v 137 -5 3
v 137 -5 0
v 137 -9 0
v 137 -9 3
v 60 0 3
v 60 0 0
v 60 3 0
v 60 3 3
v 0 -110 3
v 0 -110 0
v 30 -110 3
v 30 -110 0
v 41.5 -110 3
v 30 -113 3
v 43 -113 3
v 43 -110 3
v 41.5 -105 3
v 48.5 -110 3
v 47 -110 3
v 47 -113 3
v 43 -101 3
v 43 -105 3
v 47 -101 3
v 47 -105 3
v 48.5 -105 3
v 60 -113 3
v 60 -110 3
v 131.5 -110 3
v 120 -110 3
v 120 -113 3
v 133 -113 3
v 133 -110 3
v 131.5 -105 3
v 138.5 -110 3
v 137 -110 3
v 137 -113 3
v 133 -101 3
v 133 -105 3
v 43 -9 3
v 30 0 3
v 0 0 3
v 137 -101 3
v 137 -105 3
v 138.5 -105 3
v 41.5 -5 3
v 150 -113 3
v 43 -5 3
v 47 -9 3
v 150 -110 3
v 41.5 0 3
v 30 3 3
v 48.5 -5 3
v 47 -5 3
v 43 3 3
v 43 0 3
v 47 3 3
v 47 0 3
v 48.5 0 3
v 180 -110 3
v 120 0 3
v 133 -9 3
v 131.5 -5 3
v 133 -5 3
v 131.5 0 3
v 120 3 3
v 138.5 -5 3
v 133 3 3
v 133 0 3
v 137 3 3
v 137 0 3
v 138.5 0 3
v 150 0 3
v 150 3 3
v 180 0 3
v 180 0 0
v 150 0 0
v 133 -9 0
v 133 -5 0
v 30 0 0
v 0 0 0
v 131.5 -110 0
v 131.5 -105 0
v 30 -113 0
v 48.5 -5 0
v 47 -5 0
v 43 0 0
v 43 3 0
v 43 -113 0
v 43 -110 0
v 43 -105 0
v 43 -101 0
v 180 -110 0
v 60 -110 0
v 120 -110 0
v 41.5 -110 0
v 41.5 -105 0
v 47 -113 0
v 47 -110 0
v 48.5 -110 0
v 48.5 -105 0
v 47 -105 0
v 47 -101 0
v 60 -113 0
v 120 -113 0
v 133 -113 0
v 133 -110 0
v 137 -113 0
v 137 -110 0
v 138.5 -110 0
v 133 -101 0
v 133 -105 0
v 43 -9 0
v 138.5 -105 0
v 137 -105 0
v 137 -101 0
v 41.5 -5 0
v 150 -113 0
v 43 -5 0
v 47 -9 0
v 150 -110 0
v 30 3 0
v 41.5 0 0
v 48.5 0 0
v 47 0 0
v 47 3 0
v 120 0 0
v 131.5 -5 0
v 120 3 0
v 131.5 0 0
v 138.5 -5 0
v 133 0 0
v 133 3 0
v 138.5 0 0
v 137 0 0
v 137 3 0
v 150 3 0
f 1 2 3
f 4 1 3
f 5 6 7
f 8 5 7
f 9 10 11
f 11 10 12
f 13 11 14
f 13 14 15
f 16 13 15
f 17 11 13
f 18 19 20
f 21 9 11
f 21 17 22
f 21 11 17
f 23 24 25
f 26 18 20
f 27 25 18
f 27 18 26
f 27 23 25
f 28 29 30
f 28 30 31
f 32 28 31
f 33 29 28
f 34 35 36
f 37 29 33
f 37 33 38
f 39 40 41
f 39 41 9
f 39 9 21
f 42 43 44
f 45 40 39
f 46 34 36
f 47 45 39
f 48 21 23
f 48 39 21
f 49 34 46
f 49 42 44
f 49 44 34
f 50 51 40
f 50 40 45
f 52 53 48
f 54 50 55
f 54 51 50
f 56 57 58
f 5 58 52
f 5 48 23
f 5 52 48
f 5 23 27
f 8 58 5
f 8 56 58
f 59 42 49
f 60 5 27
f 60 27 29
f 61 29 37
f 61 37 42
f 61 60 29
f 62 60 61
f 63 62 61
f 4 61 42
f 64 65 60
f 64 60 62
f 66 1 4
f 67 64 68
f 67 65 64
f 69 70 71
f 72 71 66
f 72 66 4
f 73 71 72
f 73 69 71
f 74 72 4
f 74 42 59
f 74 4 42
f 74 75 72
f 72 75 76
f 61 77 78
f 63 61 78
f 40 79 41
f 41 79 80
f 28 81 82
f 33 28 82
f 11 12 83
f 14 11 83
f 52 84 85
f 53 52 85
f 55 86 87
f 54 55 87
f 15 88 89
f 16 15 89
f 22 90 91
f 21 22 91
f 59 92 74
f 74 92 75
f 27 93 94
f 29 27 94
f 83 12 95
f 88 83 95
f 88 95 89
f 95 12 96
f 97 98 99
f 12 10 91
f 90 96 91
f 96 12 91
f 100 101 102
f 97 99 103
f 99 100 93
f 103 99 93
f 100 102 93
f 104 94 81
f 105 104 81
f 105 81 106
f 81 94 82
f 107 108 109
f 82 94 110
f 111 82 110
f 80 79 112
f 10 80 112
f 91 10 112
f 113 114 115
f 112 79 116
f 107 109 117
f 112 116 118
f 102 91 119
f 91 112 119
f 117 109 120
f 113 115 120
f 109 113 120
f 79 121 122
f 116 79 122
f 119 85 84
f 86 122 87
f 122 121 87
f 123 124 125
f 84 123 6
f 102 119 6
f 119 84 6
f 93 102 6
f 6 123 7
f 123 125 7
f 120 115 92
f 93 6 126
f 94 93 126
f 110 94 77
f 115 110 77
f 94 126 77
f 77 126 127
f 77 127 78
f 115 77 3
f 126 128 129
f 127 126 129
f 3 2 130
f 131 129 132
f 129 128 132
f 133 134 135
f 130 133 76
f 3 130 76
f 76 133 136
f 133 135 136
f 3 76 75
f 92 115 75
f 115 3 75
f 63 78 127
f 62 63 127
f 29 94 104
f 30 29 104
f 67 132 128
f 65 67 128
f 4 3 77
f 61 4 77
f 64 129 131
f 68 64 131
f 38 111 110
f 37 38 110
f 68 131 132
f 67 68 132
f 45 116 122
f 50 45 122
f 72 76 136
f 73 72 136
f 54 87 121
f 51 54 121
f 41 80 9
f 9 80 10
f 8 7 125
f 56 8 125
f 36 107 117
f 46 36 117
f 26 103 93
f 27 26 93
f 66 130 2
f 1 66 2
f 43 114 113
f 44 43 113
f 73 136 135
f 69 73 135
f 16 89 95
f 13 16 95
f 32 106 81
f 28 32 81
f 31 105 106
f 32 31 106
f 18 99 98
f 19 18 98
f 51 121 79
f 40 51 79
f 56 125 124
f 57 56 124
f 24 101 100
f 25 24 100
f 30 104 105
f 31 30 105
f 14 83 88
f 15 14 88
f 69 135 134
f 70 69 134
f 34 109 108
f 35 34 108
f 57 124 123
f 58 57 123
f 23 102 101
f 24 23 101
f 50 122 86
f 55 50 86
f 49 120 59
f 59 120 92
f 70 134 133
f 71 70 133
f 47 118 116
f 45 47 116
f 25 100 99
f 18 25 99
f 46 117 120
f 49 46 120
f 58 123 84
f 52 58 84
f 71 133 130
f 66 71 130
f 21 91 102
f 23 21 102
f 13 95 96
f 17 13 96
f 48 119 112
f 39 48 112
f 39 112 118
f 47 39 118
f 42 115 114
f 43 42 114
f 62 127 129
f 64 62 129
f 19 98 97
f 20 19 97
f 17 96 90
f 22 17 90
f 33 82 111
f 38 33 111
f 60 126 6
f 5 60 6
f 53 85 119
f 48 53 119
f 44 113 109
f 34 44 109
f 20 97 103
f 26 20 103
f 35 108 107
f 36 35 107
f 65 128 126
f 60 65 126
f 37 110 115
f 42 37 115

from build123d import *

# Parameters (mm, degrees)
EXTRUDE_1_DEPTH = 3


with BuildPart() as part:
    # 草图1 → 凸台-拉伸1 (new body)
    with BuildSketch(Plane.XY):
        Polygon((90, -55), (90, 0), (60, 0), (48.5, 0), (48.5, -5), (47, -5), (47, -9), (43, -9), (43, -5), (41.5, -5), (41.5, 0), (30, 0), (0, 0), (0, -55), align=None)
        Polygon((120, 0), (90, 0), (90, -55), (180, -55), (180, 0), (150, 0), (138.5, 0), (138.5, -5), (137, -5), (137, -9), (133, -9), (133, -5), (131.5, -5), (131.5, 0), align=None)
        Polygon((180, -55), (90, -55), (90, -110), (120, -110), (131.5, -110), (131.5, -105), (133, -105), (133, -101), (137, -101), (137, -105), (138.5, -105), (138.5, -110), (150, -110), (180, -110), align=None)
        Polygon((90, -110), (90, -55), (0, -55), (0, -110), (30, -110), (41.5, -110), (41.5, -105), (43, -105), (43, -101), (47, -101), (47, -105), (48.5, -105), (48.5, -110), (60, -110), align=None)
        Polygon((120, 3), (120, 0), (131.5, 0), (133, 0), (133, 3), align=None)
        Polygon((138.5, 0), (150, 0), (150, 3), (137, 3), (137, 0), align=None)
        Polygon((30, 3), (30, 0), (41.5, 0), (43, 0), (43, 3), align=None)
        Polygon((48.5, 0), (60, 0), (60, 3), (47, 3), (47, 0), align=None)
        Polygon((60, -113), (60, -110), (48.5, -110), (47, -110), (47, -113), align=None)
        Polygon((41.5, -110), (30, -110), (30, -113), (43, -113), (43, -110), align=None)
        Polygon((150, -113), (150, -110), (138.5, -110), (137, -110), (137, -113), align=None)
        Polygon((131.5, -110), (120, -110), (120, -113), (133, -113), (133, -110), align=None)
    extrude(amount=EXTRUDE_1_DEPTH)


solid = part.part
